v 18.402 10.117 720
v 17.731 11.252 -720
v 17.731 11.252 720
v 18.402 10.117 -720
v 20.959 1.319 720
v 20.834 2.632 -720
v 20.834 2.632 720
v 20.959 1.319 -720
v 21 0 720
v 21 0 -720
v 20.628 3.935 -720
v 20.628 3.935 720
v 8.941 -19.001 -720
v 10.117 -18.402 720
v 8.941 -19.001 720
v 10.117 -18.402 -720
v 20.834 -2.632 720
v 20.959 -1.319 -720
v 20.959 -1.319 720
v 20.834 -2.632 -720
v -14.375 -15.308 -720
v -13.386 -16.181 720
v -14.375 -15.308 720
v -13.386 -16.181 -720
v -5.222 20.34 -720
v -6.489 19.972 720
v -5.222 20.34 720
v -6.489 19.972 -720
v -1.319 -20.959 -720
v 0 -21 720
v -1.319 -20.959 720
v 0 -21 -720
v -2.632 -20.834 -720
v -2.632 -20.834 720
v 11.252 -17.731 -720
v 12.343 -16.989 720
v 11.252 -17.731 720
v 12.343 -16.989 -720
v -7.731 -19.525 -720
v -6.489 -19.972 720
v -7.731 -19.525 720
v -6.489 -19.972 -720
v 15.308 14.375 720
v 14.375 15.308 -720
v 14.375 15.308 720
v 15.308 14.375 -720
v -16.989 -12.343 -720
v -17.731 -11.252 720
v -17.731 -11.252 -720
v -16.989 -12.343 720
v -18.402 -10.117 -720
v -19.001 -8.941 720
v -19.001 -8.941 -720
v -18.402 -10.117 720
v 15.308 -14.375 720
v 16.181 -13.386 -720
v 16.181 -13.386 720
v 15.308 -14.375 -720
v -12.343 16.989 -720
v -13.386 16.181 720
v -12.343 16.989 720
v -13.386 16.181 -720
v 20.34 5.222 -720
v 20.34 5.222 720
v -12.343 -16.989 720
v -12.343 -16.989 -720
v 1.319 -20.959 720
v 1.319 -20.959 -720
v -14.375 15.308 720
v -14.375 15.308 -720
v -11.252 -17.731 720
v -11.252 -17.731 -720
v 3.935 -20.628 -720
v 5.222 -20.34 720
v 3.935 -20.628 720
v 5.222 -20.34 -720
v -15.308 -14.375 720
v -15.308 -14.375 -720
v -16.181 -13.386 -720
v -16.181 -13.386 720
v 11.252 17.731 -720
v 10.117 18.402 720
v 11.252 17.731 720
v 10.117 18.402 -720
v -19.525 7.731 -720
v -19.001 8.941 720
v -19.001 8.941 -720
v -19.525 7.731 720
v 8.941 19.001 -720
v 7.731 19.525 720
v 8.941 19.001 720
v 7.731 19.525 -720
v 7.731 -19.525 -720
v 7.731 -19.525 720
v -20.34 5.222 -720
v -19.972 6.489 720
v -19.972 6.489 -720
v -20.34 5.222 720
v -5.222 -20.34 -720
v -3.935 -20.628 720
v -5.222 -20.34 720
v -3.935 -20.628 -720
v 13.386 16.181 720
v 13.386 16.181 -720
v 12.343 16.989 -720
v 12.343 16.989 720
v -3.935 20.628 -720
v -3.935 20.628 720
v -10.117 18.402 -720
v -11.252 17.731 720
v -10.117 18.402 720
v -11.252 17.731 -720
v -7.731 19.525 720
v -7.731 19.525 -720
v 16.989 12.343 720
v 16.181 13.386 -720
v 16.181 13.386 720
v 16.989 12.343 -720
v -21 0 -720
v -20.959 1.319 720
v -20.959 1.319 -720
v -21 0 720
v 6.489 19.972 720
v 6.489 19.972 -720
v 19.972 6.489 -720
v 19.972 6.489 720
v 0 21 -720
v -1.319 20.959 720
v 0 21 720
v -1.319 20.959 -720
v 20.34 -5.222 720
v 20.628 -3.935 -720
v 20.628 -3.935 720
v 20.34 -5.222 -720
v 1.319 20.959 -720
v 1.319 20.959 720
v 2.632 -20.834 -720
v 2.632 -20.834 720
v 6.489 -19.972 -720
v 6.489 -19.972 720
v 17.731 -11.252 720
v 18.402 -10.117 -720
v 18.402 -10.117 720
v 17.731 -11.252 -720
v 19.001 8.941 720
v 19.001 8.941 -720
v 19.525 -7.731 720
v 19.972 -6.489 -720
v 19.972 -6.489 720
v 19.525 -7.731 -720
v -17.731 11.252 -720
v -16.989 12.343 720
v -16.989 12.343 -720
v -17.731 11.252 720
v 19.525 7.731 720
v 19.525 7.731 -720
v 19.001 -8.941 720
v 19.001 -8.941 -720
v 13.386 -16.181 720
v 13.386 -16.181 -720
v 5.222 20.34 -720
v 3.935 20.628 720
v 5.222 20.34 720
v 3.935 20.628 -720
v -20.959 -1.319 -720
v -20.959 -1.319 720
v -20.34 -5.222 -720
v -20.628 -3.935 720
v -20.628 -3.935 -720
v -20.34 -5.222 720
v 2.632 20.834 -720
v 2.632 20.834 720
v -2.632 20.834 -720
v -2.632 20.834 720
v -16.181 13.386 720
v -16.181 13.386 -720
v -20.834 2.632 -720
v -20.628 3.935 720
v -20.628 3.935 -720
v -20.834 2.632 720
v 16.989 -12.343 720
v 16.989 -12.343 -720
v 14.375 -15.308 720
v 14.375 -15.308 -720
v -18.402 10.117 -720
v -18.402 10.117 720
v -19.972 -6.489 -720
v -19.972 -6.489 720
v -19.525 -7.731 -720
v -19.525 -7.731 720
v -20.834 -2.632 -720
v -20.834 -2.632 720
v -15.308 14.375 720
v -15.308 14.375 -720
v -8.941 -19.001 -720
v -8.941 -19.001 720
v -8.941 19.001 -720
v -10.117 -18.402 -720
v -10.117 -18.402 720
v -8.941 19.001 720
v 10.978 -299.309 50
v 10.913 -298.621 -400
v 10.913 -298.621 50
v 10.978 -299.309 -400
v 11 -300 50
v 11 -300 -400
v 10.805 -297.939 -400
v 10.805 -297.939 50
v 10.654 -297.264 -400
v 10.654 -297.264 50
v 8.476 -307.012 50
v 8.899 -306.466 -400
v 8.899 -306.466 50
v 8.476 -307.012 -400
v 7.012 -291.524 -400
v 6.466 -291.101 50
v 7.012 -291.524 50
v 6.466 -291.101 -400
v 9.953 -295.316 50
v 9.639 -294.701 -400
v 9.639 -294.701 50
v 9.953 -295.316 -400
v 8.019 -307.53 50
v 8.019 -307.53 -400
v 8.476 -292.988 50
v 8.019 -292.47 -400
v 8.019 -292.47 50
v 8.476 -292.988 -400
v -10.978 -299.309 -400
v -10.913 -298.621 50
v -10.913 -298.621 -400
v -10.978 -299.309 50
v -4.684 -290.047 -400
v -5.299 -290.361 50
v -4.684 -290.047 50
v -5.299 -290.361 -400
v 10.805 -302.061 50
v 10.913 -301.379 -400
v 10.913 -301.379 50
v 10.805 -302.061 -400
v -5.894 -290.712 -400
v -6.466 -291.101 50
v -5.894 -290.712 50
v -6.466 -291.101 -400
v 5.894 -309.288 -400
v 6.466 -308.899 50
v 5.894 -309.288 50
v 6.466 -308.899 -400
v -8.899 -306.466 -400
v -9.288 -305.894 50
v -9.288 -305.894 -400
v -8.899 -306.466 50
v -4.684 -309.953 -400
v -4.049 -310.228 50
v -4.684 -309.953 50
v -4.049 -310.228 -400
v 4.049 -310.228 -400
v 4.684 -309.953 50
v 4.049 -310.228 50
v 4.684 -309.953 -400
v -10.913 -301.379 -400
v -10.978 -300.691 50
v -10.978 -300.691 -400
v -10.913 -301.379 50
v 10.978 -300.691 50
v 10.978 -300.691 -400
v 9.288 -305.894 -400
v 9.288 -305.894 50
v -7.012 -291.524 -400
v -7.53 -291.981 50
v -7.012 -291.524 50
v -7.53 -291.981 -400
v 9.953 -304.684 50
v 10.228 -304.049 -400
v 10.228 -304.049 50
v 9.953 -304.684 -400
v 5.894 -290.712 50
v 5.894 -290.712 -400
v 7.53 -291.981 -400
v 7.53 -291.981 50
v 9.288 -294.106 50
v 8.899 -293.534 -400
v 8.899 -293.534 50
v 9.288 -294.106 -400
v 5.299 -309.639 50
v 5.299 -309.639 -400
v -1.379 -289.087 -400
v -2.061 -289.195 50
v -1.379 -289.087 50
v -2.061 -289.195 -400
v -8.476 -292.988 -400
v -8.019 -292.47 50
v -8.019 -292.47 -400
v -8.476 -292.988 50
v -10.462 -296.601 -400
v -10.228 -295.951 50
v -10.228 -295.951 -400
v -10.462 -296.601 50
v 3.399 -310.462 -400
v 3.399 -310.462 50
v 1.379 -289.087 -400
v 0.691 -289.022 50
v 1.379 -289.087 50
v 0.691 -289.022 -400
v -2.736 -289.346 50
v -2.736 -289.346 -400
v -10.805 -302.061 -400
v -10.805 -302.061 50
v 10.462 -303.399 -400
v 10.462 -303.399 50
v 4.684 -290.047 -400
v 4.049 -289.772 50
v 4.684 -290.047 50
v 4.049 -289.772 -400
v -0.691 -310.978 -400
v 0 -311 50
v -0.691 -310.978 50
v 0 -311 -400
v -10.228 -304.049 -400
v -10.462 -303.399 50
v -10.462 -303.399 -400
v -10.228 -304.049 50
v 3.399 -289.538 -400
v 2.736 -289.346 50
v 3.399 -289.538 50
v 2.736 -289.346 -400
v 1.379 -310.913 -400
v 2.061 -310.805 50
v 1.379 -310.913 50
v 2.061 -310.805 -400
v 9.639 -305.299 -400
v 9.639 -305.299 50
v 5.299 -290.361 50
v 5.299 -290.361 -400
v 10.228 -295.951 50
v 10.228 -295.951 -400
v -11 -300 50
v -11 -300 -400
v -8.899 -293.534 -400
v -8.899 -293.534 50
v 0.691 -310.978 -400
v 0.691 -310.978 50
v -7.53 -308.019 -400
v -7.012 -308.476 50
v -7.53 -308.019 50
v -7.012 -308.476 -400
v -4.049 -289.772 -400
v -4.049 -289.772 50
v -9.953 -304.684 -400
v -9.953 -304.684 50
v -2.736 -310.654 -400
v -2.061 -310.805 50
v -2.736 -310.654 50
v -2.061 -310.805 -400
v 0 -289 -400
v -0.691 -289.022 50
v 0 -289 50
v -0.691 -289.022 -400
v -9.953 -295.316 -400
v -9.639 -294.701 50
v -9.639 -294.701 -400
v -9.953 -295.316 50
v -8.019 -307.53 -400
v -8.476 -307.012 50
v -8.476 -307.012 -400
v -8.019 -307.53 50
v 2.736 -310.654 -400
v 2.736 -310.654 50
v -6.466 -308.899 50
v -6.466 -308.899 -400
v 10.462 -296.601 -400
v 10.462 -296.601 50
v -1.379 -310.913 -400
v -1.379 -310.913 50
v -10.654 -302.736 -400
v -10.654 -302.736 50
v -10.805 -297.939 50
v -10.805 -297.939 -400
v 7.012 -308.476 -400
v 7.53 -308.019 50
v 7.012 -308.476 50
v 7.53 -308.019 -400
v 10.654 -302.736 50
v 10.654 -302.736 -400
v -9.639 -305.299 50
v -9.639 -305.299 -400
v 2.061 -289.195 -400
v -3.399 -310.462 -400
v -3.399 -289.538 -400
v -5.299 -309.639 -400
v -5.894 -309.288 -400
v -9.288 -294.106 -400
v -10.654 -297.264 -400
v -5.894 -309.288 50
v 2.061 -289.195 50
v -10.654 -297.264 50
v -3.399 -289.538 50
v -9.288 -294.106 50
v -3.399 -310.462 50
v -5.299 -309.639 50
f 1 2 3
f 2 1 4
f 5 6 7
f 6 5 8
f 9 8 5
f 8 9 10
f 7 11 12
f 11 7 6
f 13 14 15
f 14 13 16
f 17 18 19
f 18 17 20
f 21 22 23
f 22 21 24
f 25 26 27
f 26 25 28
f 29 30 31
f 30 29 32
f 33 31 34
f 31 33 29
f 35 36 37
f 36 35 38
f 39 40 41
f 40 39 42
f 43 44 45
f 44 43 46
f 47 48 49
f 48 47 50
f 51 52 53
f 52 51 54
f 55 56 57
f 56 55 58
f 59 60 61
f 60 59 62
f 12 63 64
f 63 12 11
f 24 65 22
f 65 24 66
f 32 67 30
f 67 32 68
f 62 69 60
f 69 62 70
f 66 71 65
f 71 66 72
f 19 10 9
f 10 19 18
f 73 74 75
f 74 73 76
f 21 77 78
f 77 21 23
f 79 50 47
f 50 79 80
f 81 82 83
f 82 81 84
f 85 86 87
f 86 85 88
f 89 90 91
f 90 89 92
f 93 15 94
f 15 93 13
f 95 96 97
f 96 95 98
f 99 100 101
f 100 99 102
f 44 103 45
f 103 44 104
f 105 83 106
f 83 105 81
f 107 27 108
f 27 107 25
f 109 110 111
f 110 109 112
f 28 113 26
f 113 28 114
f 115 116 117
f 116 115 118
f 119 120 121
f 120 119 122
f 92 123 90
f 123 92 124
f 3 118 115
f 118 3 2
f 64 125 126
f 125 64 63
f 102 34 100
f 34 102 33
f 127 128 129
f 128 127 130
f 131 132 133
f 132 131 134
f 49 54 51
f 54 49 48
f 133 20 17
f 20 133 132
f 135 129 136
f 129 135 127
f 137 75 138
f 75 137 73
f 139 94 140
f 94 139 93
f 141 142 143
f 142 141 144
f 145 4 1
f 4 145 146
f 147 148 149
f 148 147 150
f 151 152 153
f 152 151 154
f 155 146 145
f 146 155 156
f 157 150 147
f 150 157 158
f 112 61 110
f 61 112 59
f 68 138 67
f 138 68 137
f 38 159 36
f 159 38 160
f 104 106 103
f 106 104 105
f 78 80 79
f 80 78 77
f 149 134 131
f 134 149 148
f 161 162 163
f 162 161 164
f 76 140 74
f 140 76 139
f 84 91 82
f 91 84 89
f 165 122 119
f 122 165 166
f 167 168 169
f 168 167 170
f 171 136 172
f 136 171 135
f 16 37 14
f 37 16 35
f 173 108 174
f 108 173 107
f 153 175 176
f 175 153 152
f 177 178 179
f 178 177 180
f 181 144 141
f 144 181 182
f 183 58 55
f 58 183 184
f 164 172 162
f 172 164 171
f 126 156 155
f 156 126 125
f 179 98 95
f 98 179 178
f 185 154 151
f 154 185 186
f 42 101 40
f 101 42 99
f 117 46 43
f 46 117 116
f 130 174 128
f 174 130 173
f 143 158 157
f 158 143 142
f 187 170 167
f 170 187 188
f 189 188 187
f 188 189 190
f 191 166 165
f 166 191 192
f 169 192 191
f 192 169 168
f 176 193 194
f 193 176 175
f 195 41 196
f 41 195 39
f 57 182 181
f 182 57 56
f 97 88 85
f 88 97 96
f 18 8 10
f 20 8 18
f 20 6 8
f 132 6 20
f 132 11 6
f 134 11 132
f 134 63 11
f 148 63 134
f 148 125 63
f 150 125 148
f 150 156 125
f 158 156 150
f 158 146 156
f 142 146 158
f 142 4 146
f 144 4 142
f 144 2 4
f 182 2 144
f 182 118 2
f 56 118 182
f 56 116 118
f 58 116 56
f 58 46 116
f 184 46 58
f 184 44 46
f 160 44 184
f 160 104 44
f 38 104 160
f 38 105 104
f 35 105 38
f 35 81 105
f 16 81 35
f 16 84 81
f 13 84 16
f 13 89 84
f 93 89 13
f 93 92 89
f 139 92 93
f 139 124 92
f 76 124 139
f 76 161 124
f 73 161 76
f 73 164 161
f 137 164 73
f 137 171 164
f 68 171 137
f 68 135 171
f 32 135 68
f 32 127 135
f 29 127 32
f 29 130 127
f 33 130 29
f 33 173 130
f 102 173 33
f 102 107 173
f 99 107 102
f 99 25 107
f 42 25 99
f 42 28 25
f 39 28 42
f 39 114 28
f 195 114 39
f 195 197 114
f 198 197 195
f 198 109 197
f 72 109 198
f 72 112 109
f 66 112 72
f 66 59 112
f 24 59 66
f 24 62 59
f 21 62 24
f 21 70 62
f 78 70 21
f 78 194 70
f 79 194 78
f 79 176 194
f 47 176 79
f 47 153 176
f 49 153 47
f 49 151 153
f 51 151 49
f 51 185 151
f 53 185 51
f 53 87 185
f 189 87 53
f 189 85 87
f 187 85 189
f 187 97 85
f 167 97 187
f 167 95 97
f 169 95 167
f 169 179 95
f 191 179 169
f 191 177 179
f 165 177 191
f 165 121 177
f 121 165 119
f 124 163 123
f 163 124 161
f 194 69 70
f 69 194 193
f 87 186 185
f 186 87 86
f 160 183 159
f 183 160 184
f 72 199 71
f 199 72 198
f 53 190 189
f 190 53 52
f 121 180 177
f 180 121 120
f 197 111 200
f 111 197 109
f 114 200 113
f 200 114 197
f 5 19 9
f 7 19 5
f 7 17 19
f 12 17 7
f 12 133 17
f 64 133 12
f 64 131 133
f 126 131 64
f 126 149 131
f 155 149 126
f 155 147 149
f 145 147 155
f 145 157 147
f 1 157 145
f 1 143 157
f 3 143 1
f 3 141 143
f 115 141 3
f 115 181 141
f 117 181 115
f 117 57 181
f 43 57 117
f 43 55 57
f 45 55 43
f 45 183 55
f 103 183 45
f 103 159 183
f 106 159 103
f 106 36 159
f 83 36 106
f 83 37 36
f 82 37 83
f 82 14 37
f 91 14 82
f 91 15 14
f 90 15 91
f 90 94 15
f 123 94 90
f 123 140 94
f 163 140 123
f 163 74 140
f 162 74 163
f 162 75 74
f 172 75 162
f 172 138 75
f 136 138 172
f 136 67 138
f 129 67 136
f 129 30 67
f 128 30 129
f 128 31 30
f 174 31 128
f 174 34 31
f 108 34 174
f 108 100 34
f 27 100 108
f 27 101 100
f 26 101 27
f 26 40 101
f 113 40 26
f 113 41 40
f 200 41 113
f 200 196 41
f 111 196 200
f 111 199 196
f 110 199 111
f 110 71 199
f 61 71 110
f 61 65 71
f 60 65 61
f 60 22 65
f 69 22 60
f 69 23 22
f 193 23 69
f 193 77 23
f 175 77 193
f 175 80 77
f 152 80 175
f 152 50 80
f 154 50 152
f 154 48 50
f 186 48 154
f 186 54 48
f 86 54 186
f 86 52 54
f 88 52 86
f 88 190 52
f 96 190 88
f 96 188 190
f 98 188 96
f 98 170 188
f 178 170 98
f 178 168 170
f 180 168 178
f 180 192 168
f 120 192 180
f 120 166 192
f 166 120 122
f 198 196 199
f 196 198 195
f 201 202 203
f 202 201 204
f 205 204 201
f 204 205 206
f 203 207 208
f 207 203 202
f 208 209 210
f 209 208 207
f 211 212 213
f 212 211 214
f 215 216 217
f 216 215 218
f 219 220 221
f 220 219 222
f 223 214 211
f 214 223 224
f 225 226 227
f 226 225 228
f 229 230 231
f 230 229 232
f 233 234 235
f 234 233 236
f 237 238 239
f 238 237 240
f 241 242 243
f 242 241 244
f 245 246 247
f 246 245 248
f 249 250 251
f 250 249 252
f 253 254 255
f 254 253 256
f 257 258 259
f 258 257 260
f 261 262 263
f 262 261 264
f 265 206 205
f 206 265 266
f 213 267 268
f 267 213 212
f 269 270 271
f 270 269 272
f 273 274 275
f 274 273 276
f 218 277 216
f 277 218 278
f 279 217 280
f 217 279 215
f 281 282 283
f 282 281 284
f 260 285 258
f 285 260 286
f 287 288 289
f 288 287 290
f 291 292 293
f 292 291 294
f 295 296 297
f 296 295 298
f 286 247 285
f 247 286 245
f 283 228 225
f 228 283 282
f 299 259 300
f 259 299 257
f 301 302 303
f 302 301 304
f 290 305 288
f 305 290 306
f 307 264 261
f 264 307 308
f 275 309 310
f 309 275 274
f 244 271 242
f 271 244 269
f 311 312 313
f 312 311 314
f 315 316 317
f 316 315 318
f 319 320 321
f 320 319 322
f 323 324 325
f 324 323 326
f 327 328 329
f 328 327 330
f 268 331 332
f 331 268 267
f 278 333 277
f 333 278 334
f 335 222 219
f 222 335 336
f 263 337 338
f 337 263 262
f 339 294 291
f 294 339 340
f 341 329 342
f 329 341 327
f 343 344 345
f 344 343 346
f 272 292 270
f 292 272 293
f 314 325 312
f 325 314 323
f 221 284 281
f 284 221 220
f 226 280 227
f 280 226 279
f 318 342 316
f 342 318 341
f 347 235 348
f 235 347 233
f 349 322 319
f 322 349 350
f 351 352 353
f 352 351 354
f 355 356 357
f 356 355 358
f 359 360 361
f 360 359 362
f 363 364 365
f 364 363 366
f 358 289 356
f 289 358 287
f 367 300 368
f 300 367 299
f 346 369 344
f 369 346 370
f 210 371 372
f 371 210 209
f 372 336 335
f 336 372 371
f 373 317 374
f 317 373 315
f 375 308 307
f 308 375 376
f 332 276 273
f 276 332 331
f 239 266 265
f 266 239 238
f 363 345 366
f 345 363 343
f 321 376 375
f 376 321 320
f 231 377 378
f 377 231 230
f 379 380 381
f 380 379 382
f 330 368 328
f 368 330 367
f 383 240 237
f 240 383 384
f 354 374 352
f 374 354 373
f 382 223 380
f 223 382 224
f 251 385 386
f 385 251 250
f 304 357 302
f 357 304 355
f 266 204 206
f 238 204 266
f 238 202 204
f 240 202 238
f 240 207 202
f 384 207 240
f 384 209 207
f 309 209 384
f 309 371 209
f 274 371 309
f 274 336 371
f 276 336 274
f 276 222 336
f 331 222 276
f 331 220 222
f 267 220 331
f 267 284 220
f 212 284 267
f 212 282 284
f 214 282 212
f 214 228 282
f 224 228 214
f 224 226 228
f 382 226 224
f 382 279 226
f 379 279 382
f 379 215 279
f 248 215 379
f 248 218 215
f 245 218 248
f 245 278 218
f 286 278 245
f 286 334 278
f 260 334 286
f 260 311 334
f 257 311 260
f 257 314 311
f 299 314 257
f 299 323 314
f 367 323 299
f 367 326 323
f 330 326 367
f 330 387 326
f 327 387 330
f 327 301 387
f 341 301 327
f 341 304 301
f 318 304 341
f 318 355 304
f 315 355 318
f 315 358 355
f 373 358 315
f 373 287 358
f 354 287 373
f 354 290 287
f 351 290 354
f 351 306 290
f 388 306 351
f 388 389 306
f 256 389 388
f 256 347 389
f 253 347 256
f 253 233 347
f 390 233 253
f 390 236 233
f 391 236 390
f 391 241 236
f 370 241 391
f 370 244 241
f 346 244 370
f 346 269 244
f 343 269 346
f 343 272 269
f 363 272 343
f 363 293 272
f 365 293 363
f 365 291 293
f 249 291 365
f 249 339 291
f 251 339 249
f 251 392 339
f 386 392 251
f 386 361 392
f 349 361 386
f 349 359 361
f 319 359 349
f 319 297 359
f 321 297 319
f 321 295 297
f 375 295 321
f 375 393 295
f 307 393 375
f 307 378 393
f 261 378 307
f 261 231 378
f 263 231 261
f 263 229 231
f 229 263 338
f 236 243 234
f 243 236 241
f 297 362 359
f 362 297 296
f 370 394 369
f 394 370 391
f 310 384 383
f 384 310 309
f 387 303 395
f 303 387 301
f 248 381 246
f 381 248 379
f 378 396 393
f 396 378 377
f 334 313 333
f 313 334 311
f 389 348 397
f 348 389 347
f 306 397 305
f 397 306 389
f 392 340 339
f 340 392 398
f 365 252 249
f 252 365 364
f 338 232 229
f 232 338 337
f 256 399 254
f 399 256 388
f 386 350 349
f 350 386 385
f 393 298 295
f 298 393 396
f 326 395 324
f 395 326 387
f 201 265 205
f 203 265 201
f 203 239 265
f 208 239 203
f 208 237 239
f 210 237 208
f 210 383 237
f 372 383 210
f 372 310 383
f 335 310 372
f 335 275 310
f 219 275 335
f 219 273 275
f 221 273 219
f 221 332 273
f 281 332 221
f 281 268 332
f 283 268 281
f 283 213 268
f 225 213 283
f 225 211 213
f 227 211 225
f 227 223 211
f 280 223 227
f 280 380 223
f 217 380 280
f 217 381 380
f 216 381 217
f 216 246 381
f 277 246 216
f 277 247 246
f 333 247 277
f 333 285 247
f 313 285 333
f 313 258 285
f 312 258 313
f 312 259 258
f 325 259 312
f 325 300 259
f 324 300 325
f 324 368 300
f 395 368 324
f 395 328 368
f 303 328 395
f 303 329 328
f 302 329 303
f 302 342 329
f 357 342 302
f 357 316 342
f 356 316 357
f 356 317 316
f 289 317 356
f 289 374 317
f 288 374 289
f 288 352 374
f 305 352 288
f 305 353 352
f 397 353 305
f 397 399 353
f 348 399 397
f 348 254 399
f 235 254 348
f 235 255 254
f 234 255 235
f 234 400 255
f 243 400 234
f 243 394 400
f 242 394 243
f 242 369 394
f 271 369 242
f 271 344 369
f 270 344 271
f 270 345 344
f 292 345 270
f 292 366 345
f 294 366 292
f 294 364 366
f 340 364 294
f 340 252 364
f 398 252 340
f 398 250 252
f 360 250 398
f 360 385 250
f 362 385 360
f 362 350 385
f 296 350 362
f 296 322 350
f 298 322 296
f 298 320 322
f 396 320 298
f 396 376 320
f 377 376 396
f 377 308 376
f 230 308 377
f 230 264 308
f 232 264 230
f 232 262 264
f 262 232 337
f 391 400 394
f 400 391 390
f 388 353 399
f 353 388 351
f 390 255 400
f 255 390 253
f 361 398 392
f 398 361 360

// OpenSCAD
// ============================================================================
// PROJECT: XXXG-00W0 WING GUNDAM ZERO EW - TORSO INNER BACKBONE INFRA
// COMPONENT VAULT: BANDAI CAST RUNNER G - LUMBAR CORES G13 & G14
// PACKAGING RE-ARCHITECTURE: SUB-ARMOR CAPACITOR RECESSED BANK INTEGRATION
// DESIGN STYLE: NVIDIA FOUNDERS EDITION AGGRESSIVE PLANAR GEOMETRY MATRIX
// CONFIG METRIC: SCALED TITANIUM CASTS WITH GYRO CAVITIES (1:1 ACTUAL METRIC)
// ============================================================================

$fn = 100; // High-precision circular resolution segment count

// Structural Constraints Scaled 1:1 for a 16.7-Meter Airframe Scale (mm)
spine_total_length = 960;                // Total longitudinal vertical spine height (mm)
gyro_cavity_diameter = 320;              // Internal gyroscopic stabilization core width (mm)
armor_skin_thickness = 65;              // Solid TiAl protective plating wall (mm)
harness_conduit_width = 80;             // Cast-in 4oz copper logic trace track (mm)
capacitor_pocket_depth = 15;            // Sub-armor recessed housing pocket depth (mm)
capacitor_pocket_width = 140;           // Transverse MLCC array pocket width (mm)

module Runner_G_Lumbar_Core_Forge() {
    // Central Supply Injection Runner Axis (Molten Feed Line from Siphon Forge)
    color([0.22, 0.22, 0.25]) {
        cylinder(h = spine_total_length * 1.5, d = 42, center = true);
        // Direct injection gates tracking straight into the part mold cavities
        translate() rotate() cylinder(h = 450, d = 22);
        translate([0, -300, -400]) rotate() cylinder(h = 450, d = 22);
    }
    
    // Instantiate Scaled Skeutomorphic Part Molds Symmetrically (Left & Right)
    Cast_Internal_Lumbar_Cores();
}

module Cast_Internal_Lumbar_Cores() {
    // ---- PART G13: INTERNAL LEFT LOWER LUMBAR SPINE LINKAGE CORE ----
    translate([-380, 0, 350]) color([0.35, 0.35, 0.38]) { // Inner Frame Dark Spec
        difference() {
            // Main solid heavy-duty interlocking spinal vertebrae structure block
            cube([460, 320, spine_total_length * 0.45], center = true);
            
            // INTERNAL GYROSCOPIC CORE CAVITY [Bored out for snap-circuit gyro alignment]
            cylinder(h = spine_total_length * 0.5, d = gyro_cavity_diameter, center = true);
            
            // SUB-ARMOR RECESSED CAPACITOR POCKETS [Segmented rows cut inside the vertebrae walls]
            for (z_offset = [-120, 0, 120]) {
                translate([(460/2 - armor_skin_thickness + capacitor_pocket_depth/2), 0, z_offset])
                    cube([capacitor_pocket_depth, capacitor_pocket_width, 80], center = true);
            }
            
            // Continuous cast-in routing track for the 4oz solid-state wiring rails
            cube([harness_conduit_width, 340, spine_total_length], center = true);
            
            // Slicing profile tool to generate an asymmetrical half-shell part component
            translate()
                cube([460, 400, spine_total_length * 2], center = true);
        }
    }
    
    // ---- PART G14: INTERNAL RIGHT LOWER LUMBAR SPINE LINKAGE CORE ----
    translate([380, 0, -350]) rotate() color([0.35, 0.35, 0.38]) {
        difference() {
            cube([460, 320, spine_total_length * 0.45], center = true);
            cylinder(h = spine_total_length * 0.5, d = gyro_cavity_diameter, center = true);
            
            for (z_offset = [-120, 0, 120]) {
                translate([(460/2 - armor_skin_thickness + capacitor_pocket_depth/2), 0, z_offset])
                    cube([capacitor_pocket_depth, capacitor_pocket_width, 80], center = true);
            }
            
            cube([harness_conduit_width, 340, spine_total_length], center = true);
            translate()
                cube([460, 400, spine_total_length * 2], center = true);
        }
    }
}

// Render Master Assembly to Parameter Workspace
Runner_G_Lumbar_Core_Forge();
